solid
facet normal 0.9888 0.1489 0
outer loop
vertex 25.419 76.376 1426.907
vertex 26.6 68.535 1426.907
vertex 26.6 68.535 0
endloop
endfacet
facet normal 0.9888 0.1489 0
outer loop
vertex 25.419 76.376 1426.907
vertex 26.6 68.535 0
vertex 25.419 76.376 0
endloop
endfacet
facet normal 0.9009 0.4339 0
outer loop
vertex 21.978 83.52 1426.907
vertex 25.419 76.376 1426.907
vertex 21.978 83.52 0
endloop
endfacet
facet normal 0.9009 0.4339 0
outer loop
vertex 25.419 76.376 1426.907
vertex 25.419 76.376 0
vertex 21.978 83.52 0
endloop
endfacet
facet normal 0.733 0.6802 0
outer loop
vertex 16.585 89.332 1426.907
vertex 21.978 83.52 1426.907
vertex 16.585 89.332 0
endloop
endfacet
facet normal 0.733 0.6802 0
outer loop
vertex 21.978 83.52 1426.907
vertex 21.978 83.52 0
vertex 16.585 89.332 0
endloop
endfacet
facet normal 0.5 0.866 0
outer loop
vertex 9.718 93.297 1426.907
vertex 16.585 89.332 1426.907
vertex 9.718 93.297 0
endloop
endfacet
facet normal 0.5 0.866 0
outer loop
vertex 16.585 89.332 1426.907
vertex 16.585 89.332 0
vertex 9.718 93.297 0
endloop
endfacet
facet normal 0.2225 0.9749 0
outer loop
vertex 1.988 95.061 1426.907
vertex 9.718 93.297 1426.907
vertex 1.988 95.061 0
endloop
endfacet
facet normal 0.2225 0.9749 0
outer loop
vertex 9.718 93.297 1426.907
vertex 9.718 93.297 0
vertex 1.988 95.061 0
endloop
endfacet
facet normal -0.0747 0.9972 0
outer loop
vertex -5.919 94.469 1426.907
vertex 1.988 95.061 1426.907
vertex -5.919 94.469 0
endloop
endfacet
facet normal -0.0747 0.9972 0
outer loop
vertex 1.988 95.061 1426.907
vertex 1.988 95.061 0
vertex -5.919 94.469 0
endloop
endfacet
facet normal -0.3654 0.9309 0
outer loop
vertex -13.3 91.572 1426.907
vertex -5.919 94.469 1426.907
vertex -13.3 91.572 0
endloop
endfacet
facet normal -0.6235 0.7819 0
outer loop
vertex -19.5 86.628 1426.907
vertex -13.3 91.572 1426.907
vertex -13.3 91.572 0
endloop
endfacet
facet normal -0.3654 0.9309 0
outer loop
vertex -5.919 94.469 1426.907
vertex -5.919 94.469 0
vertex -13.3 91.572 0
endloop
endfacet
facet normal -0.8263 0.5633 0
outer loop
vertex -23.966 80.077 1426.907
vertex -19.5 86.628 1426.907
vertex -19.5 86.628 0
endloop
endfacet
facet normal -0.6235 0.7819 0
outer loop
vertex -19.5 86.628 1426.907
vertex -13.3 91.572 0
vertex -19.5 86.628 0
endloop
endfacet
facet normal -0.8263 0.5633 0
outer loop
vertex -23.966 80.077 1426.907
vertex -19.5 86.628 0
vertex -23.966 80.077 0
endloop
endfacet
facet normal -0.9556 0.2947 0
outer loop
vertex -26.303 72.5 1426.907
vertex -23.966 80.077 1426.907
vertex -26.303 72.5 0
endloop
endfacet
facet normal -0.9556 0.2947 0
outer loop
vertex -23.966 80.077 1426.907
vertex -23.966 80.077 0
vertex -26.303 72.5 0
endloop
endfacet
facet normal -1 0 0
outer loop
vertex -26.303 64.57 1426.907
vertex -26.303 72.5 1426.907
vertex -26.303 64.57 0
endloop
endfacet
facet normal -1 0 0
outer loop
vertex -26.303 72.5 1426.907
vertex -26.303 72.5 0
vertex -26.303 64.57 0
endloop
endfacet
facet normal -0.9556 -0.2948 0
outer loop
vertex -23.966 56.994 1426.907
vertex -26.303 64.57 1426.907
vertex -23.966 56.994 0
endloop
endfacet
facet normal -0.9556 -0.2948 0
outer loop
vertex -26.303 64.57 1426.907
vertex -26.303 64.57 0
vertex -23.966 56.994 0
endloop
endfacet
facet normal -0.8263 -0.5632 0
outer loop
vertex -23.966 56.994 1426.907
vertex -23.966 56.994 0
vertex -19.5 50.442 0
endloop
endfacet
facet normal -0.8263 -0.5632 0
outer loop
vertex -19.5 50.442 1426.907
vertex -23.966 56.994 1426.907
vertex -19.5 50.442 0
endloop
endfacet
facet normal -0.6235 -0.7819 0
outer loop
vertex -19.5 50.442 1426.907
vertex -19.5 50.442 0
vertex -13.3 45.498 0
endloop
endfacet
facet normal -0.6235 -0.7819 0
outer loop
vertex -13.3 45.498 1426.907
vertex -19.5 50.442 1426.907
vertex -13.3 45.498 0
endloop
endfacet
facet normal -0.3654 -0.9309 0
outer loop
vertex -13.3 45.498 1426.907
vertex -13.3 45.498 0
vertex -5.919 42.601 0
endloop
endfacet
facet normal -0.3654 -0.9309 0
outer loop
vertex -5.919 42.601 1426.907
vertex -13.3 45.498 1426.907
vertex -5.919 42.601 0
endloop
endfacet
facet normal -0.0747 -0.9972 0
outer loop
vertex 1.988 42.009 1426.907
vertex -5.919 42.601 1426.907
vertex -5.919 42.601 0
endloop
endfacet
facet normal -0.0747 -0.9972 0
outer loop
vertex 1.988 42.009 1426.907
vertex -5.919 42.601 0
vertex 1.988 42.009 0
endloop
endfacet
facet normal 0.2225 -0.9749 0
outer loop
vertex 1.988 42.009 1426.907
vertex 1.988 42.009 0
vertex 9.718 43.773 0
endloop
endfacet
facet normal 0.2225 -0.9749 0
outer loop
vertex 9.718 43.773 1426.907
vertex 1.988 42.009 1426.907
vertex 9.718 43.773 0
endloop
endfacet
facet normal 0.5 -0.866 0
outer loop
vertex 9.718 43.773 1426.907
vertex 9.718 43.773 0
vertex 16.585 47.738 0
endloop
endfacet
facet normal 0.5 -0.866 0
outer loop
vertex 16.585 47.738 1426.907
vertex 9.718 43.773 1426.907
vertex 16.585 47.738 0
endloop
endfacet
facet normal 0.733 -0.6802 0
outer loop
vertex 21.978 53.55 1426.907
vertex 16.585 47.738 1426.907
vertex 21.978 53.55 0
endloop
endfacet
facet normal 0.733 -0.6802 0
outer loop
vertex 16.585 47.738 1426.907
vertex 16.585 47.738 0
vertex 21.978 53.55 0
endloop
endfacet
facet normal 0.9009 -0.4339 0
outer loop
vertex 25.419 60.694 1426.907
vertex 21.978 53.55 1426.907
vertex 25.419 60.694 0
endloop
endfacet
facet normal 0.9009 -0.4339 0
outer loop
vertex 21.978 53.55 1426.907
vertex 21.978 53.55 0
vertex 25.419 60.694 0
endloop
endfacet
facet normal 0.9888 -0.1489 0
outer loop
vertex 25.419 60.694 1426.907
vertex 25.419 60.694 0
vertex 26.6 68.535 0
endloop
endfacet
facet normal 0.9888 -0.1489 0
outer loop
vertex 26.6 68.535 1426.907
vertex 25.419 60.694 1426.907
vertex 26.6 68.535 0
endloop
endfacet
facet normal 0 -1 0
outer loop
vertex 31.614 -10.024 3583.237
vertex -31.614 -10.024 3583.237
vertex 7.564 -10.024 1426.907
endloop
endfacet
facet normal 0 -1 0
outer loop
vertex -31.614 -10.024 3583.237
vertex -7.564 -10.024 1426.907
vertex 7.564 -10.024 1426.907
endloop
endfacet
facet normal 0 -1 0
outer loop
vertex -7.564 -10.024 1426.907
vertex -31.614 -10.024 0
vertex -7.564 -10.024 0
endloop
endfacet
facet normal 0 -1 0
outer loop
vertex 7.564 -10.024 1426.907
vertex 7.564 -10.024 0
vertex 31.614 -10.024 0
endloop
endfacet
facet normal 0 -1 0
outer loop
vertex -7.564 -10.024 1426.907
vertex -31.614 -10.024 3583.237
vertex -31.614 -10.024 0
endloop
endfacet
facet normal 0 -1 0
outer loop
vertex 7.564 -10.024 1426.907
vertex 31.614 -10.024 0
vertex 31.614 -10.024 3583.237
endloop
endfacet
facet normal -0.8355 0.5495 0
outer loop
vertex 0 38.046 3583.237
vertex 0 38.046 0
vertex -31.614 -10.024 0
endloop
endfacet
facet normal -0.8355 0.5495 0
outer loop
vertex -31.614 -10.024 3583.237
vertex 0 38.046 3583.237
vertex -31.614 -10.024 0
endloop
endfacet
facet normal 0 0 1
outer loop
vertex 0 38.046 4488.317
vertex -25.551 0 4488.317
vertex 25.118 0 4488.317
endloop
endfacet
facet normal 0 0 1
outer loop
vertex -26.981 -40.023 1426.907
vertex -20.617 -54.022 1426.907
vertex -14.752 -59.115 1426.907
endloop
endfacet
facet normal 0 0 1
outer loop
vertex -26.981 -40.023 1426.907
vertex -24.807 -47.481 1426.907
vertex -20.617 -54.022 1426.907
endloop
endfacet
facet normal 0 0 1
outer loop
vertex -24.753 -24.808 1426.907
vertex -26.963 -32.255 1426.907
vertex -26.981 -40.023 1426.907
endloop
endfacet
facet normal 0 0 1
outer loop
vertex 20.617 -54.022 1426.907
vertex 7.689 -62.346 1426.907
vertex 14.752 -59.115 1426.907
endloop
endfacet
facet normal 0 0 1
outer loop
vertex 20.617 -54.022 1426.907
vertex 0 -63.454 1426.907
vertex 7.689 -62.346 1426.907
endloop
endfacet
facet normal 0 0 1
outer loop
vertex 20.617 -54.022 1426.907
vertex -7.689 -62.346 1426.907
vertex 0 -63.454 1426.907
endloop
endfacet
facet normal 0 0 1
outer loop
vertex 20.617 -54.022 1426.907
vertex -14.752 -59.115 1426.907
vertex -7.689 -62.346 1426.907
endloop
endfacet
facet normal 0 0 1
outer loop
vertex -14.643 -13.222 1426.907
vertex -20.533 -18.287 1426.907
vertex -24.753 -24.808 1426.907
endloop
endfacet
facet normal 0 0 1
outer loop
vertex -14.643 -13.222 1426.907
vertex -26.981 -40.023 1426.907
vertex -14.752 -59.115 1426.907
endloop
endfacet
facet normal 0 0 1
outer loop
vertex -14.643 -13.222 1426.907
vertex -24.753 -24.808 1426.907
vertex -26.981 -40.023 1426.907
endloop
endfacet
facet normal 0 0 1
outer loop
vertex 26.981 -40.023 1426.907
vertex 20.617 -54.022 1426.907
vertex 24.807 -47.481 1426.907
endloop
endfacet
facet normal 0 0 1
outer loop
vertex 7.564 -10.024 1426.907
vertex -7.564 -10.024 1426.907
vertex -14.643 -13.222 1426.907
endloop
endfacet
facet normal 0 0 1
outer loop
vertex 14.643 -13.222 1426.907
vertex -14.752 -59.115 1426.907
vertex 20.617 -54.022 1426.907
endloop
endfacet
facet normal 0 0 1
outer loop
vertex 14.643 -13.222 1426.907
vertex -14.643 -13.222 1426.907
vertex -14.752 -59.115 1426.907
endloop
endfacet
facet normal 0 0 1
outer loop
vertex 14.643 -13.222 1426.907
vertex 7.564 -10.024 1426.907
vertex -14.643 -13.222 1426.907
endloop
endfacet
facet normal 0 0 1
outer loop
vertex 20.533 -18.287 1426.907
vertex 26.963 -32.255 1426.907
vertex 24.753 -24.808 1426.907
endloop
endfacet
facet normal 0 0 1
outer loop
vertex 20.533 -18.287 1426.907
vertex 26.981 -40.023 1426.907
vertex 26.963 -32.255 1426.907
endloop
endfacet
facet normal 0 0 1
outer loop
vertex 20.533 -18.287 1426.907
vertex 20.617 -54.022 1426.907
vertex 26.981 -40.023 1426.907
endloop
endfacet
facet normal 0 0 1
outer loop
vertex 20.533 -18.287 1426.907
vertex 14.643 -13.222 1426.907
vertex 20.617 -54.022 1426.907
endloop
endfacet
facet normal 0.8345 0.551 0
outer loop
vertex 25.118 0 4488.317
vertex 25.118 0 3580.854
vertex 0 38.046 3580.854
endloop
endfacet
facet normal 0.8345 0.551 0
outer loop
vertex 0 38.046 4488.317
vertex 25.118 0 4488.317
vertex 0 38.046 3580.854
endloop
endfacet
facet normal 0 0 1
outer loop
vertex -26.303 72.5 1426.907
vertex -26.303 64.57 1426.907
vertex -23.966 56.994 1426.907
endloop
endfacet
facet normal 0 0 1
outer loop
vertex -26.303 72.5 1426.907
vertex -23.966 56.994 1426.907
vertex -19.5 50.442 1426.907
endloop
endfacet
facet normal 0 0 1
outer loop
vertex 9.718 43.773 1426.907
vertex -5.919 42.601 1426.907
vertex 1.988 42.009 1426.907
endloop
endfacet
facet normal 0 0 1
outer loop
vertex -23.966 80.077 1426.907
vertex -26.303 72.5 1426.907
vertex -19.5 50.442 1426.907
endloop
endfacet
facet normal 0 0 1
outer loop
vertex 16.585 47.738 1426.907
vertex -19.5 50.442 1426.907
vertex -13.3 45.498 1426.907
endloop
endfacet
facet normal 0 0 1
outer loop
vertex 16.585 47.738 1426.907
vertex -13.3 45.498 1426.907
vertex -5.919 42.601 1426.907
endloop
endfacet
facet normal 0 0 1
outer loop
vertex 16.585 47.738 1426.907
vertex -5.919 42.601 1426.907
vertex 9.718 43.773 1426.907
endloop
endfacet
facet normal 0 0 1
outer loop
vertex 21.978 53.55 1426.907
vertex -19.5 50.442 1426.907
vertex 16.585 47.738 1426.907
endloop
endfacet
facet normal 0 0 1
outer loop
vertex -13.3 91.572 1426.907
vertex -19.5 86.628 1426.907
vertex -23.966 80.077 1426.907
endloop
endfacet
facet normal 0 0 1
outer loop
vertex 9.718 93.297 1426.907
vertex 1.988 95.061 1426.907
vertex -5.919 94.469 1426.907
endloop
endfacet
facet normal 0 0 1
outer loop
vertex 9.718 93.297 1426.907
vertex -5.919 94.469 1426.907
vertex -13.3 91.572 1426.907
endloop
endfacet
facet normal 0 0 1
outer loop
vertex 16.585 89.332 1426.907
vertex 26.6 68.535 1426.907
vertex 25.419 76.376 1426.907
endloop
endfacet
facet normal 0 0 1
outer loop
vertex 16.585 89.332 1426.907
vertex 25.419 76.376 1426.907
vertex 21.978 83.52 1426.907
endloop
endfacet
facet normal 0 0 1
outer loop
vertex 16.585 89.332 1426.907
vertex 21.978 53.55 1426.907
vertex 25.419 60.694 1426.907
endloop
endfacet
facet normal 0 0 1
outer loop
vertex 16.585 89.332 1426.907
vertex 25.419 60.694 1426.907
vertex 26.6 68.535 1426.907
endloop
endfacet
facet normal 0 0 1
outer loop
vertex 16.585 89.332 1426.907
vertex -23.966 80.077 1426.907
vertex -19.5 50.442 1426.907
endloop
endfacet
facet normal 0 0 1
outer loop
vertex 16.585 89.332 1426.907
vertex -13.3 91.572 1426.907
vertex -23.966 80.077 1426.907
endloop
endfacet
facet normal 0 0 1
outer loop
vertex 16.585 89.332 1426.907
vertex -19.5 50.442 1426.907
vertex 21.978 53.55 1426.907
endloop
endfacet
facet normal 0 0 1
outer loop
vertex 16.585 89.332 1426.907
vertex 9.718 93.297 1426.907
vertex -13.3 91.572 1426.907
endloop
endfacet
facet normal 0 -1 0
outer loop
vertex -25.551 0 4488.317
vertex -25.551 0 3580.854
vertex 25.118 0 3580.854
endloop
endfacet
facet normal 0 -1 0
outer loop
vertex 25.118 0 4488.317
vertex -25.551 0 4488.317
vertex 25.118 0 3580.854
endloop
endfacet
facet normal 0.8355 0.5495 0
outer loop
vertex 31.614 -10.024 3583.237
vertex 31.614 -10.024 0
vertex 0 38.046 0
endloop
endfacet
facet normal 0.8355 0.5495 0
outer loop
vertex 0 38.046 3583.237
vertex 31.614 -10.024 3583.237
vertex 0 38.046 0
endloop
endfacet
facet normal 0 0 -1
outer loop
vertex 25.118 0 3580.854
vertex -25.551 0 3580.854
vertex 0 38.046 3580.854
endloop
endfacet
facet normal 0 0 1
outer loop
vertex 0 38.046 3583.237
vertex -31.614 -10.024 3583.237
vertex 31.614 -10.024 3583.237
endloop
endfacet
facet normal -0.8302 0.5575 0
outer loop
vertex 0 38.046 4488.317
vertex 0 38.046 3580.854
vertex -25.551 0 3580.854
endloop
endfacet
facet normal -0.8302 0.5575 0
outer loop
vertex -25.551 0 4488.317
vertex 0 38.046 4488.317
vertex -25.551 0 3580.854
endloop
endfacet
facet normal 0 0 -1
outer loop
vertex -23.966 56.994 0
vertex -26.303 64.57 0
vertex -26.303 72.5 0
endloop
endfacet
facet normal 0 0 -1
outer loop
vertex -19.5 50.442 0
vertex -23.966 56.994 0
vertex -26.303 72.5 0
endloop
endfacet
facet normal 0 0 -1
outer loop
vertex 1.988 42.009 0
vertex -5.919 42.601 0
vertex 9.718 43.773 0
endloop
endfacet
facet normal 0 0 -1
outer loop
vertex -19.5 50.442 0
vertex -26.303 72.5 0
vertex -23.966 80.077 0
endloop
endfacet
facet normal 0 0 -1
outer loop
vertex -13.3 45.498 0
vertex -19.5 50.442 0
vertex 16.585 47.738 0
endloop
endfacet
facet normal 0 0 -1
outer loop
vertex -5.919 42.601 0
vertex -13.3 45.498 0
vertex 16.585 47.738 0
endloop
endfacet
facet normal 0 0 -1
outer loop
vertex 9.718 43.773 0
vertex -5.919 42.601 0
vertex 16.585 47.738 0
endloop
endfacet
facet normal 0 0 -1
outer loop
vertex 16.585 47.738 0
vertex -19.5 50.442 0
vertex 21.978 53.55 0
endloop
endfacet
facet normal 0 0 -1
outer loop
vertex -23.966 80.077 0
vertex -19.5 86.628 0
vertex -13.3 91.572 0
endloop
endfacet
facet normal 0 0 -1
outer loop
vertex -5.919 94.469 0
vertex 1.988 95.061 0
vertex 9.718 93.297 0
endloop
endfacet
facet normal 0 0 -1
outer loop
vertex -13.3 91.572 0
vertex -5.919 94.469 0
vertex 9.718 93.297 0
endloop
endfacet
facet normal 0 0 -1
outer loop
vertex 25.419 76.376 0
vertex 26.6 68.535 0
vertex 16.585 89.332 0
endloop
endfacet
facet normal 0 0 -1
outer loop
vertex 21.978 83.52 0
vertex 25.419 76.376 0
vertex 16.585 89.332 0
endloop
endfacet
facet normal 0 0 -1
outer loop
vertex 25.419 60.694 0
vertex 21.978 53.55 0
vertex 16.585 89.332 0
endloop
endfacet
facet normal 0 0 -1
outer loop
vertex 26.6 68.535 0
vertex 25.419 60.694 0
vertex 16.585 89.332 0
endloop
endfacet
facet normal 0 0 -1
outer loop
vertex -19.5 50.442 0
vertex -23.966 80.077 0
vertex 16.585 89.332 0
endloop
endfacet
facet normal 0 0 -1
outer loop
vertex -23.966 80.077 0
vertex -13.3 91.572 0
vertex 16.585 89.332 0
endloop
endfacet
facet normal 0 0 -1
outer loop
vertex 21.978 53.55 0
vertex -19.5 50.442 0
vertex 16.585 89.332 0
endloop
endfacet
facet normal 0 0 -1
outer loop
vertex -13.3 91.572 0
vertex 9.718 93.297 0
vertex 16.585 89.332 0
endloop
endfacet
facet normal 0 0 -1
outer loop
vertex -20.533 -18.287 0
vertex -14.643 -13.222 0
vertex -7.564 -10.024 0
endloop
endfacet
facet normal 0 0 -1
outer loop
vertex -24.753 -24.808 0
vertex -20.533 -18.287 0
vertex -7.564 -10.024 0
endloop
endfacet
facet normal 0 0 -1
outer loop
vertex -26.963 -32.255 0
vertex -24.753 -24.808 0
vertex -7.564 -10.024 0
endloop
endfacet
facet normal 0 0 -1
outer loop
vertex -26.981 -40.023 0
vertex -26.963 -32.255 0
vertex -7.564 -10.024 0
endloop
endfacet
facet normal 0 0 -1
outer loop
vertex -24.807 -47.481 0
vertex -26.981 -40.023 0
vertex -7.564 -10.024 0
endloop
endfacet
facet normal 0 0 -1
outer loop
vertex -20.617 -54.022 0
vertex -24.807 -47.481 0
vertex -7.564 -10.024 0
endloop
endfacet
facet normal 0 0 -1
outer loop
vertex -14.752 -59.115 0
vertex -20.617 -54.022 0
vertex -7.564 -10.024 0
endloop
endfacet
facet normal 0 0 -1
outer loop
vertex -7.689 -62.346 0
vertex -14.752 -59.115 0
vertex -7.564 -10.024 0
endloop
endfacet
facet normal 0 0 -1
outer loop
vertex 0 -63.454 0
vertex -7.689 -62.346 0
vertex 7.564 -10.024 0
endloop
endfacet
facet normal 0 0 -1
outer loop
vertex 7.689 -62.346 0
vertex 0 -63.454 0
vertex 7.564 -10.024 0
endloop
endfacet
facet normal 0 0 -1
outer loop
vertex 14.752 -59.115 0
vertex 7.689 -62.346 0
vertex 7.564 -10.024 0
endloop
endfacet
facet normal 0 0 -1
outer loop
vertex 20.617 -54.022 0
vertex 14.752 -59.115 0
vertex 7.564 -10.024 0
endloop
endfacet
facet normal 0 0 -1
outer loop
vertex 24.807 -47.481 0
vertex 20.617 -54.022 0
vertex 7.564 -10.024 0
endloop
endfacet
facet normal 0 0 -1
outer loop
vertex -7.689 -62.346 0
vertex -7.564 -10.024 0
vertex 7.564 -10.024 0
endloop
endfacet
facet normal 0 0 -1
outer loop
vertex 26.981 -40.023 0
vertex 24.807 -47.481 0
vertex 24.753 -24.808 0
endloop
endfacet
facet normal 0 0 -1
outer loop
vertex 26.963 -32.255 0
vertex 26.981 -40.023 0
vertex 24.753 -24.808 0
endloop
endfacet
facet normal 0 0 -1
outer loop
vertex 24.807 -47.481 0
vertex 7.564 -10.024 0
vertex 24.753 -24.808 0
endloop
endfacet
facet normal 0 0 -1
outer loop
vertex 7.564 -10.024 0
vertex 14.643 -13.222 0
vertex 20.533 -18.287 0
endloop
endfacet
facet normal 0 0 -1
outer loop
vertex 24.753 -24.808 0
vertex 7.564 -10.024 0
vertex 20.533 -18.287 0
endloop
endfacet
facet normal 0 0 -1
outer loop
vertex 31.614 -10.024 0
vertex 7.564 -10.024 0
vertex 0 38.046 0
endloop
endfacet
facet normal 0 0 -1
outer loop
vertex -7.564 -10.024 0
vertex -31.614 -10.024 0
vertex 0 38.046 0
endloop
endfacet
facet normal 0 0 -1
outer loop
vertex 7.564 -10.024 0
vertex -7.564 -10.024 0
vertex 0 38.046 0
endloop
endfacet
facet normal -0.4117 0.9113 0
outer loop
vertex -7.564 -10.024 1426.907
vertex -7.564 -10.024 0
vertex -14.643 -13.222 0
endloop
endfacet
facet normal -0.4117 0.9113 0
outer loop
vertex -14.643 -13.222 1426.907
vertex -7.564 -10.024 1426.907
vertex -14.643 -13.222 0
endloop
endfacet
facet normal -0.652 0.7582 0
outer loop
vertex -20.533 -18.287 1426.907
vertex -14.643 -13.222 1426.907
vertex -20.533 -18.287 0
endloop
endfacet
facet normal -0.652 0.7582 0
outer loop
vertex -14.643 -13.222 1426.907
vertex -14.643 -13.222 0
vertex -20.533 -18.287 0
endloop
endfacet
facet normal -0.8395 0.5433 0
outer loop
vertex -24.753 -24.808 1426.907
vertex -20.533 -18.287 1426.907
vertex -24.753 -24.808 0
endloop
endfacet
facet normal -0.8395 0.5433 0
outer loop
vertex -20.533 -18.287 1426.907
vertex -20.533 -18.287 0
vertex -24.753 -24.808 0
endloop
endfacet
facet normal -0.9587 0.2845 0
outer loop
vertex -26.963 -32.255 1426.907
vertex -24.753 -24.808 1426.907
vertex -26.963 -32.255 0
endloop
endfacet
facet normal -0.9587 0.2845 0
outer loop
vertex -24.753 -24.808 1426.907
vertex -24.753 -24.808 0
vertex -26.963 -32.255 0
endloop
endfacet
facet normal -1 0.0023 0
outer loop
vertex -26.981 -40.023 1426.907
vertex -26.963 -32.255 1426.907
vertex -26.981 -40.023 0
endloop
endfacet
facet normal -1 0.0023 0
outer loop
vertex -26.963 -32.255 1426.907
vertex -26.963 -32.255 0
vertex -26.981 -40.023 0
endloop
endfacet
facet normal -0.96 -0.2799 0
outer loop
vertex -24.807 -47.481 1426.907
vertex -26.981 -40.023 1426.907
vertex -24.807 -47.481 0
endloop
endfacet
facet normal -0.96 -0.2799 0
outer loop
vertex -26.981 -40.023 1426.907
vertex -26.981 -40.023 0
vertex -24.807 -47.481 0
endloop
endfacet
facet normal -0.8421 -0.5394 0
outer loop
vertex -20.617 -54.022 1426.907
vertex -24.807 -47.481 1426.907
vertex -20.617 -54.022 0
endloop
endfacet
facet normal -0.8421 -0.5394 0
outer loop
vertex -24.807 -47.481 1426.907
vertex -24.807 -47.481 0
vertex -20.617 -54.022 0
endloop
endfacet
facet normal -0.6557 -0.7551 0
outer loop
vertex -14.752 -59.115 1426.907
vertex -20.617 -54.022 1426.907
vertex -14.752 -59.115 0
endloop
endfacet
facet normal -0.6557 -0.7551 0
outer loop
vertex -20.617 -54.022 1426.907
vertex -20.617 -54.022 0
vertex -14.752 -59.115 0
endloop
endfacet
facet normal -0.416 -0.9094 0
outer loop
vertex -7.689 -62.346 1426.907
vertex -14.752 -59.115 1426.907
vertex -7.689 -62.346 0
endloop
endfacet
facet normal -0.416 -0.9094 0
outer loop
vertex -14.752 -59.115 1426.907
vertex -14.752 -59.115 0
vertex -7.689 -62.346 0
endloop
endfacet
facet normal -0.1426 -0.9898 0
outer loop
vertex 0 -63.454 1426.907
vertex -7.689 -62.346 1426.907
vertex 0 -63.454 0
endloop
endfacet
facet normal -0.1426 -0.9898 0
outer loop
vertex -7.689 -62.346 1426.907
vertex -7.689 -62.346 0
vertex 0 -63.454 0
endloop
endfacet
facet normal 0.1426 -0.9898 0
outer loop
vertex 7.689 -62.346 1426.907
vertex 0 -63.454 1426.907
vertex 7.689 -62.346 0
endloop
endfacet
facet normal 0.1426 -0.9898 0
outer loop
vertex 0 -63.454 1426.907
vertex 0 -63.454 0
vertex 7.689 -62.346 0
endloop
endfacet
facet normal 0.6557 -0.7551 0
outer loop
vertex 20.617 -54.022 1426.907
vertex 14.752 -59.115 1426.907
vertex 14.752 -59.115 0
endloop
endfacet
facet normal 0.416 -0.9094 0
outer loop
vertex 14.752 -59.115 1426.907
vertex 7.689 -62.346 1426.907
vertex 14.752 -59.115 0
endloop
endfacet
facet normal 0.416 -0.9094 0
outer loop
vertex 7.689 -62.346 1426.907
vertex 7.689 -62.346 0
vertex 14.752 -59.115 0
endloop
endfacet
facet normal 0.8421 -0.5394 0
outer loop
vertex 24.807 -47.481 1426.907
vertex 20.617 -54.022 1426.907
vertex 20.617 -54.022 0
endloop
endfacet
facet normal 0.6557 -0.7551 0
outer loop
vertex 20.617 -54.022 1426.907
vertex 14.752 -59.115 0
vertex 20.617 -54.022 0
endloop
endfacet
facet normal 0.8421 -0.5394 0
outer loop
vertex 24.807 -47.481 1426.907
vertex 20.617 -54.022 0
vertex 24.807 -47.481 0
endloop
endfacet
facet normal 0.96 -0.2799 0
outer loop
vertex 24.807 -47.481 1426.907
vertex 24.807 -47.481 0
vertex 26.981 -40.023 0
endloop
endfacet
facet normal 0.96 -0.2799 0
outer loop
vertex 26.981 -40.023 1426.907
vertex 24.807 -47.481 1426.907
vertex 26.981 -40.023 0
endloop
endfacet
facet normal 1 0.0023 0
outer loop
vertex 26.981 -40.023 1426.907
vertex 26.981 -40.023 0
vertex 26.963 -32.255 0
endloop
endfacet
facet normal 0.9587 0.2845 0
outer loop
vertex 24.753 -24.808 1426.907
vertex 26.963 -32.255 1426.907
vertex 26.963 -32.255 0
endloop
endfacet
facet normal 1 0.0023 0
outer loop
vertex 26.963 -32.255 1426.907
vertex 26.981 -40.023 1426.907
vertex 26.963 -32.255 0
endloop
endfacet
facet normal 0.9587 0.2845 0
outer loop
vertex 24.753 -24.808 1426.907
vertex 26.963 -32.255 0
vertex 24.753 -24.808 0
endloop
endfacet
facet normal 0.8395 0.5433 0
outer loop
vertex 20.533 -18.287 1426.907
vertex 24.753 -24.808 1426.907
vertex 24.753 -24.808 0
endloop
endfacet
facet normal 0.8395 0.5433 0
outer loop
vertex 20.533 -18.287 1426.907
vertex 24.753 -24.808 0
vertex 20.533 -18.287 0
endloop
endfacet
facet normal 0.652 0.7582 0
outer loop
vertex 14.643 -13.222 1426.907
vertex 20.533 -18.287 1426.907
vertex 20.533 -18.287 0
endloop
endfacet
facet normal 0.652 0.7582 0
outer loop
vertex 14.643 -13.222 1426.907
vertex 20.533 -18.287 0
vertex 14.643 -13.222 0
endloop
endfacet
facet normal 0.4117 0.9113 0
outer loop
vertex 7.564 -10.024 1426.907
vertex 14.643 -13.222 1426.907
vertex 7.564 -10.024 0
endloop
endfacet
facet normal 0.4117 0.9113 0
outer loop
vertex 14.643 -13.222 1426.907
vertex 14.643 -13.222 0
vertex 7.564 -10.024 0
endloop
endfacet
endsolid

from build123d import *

# Parameters (mm, degrees)
F2_DEPTH = 3583.2374095917
F4_START = 3580.8544158936
F4_DEPTH = 907.4625968933
F5_R     = 27.2501989083
F6_DEPTH = 1426.9065856934
F5_R_2   = 26.6004704105


with BuildPart() as f2:
    # F1 (on Top) → F2 (new body)
    with BuildSketch(Plane.XY):
        Polygon((31.6138789058, -10.0240558386), (0, 38.0463600159), (-31.6138789058, -10.0240558386), (0, -10.0240558386), align=None)
    extrude(amount=F2_DEPTH)

    # F5 (on Top) → F6 (join)
    with BuildSketch(Plane.XY):
        with Locations((0, -36.203365773)):
            Circle(F5_R)
    extrude(amount=F6_DEPTH)


with BuildPart() as f4:
    # F3 (on Top) → F4 (new body)
    with BuildSketch(Plane.XY.offset(F4_START)):
        Polygon((25.1178741455, 0), (0, 38.0463600159), (-25.5509465933, 0), align=None)
    extrude(amount=F4_DEPTH)


with BuildPart() as f6:
    # F5 (on Top) → F6, piece 2 (new body)
    with BuildSketch(Plane.XY):
        with Locations((0, 68.535014987)):
            Circle(F5_R_2)
    extrude(amount=F6_DEPTH)


solid = Compound([f2.part, f4.part, f6.part])
